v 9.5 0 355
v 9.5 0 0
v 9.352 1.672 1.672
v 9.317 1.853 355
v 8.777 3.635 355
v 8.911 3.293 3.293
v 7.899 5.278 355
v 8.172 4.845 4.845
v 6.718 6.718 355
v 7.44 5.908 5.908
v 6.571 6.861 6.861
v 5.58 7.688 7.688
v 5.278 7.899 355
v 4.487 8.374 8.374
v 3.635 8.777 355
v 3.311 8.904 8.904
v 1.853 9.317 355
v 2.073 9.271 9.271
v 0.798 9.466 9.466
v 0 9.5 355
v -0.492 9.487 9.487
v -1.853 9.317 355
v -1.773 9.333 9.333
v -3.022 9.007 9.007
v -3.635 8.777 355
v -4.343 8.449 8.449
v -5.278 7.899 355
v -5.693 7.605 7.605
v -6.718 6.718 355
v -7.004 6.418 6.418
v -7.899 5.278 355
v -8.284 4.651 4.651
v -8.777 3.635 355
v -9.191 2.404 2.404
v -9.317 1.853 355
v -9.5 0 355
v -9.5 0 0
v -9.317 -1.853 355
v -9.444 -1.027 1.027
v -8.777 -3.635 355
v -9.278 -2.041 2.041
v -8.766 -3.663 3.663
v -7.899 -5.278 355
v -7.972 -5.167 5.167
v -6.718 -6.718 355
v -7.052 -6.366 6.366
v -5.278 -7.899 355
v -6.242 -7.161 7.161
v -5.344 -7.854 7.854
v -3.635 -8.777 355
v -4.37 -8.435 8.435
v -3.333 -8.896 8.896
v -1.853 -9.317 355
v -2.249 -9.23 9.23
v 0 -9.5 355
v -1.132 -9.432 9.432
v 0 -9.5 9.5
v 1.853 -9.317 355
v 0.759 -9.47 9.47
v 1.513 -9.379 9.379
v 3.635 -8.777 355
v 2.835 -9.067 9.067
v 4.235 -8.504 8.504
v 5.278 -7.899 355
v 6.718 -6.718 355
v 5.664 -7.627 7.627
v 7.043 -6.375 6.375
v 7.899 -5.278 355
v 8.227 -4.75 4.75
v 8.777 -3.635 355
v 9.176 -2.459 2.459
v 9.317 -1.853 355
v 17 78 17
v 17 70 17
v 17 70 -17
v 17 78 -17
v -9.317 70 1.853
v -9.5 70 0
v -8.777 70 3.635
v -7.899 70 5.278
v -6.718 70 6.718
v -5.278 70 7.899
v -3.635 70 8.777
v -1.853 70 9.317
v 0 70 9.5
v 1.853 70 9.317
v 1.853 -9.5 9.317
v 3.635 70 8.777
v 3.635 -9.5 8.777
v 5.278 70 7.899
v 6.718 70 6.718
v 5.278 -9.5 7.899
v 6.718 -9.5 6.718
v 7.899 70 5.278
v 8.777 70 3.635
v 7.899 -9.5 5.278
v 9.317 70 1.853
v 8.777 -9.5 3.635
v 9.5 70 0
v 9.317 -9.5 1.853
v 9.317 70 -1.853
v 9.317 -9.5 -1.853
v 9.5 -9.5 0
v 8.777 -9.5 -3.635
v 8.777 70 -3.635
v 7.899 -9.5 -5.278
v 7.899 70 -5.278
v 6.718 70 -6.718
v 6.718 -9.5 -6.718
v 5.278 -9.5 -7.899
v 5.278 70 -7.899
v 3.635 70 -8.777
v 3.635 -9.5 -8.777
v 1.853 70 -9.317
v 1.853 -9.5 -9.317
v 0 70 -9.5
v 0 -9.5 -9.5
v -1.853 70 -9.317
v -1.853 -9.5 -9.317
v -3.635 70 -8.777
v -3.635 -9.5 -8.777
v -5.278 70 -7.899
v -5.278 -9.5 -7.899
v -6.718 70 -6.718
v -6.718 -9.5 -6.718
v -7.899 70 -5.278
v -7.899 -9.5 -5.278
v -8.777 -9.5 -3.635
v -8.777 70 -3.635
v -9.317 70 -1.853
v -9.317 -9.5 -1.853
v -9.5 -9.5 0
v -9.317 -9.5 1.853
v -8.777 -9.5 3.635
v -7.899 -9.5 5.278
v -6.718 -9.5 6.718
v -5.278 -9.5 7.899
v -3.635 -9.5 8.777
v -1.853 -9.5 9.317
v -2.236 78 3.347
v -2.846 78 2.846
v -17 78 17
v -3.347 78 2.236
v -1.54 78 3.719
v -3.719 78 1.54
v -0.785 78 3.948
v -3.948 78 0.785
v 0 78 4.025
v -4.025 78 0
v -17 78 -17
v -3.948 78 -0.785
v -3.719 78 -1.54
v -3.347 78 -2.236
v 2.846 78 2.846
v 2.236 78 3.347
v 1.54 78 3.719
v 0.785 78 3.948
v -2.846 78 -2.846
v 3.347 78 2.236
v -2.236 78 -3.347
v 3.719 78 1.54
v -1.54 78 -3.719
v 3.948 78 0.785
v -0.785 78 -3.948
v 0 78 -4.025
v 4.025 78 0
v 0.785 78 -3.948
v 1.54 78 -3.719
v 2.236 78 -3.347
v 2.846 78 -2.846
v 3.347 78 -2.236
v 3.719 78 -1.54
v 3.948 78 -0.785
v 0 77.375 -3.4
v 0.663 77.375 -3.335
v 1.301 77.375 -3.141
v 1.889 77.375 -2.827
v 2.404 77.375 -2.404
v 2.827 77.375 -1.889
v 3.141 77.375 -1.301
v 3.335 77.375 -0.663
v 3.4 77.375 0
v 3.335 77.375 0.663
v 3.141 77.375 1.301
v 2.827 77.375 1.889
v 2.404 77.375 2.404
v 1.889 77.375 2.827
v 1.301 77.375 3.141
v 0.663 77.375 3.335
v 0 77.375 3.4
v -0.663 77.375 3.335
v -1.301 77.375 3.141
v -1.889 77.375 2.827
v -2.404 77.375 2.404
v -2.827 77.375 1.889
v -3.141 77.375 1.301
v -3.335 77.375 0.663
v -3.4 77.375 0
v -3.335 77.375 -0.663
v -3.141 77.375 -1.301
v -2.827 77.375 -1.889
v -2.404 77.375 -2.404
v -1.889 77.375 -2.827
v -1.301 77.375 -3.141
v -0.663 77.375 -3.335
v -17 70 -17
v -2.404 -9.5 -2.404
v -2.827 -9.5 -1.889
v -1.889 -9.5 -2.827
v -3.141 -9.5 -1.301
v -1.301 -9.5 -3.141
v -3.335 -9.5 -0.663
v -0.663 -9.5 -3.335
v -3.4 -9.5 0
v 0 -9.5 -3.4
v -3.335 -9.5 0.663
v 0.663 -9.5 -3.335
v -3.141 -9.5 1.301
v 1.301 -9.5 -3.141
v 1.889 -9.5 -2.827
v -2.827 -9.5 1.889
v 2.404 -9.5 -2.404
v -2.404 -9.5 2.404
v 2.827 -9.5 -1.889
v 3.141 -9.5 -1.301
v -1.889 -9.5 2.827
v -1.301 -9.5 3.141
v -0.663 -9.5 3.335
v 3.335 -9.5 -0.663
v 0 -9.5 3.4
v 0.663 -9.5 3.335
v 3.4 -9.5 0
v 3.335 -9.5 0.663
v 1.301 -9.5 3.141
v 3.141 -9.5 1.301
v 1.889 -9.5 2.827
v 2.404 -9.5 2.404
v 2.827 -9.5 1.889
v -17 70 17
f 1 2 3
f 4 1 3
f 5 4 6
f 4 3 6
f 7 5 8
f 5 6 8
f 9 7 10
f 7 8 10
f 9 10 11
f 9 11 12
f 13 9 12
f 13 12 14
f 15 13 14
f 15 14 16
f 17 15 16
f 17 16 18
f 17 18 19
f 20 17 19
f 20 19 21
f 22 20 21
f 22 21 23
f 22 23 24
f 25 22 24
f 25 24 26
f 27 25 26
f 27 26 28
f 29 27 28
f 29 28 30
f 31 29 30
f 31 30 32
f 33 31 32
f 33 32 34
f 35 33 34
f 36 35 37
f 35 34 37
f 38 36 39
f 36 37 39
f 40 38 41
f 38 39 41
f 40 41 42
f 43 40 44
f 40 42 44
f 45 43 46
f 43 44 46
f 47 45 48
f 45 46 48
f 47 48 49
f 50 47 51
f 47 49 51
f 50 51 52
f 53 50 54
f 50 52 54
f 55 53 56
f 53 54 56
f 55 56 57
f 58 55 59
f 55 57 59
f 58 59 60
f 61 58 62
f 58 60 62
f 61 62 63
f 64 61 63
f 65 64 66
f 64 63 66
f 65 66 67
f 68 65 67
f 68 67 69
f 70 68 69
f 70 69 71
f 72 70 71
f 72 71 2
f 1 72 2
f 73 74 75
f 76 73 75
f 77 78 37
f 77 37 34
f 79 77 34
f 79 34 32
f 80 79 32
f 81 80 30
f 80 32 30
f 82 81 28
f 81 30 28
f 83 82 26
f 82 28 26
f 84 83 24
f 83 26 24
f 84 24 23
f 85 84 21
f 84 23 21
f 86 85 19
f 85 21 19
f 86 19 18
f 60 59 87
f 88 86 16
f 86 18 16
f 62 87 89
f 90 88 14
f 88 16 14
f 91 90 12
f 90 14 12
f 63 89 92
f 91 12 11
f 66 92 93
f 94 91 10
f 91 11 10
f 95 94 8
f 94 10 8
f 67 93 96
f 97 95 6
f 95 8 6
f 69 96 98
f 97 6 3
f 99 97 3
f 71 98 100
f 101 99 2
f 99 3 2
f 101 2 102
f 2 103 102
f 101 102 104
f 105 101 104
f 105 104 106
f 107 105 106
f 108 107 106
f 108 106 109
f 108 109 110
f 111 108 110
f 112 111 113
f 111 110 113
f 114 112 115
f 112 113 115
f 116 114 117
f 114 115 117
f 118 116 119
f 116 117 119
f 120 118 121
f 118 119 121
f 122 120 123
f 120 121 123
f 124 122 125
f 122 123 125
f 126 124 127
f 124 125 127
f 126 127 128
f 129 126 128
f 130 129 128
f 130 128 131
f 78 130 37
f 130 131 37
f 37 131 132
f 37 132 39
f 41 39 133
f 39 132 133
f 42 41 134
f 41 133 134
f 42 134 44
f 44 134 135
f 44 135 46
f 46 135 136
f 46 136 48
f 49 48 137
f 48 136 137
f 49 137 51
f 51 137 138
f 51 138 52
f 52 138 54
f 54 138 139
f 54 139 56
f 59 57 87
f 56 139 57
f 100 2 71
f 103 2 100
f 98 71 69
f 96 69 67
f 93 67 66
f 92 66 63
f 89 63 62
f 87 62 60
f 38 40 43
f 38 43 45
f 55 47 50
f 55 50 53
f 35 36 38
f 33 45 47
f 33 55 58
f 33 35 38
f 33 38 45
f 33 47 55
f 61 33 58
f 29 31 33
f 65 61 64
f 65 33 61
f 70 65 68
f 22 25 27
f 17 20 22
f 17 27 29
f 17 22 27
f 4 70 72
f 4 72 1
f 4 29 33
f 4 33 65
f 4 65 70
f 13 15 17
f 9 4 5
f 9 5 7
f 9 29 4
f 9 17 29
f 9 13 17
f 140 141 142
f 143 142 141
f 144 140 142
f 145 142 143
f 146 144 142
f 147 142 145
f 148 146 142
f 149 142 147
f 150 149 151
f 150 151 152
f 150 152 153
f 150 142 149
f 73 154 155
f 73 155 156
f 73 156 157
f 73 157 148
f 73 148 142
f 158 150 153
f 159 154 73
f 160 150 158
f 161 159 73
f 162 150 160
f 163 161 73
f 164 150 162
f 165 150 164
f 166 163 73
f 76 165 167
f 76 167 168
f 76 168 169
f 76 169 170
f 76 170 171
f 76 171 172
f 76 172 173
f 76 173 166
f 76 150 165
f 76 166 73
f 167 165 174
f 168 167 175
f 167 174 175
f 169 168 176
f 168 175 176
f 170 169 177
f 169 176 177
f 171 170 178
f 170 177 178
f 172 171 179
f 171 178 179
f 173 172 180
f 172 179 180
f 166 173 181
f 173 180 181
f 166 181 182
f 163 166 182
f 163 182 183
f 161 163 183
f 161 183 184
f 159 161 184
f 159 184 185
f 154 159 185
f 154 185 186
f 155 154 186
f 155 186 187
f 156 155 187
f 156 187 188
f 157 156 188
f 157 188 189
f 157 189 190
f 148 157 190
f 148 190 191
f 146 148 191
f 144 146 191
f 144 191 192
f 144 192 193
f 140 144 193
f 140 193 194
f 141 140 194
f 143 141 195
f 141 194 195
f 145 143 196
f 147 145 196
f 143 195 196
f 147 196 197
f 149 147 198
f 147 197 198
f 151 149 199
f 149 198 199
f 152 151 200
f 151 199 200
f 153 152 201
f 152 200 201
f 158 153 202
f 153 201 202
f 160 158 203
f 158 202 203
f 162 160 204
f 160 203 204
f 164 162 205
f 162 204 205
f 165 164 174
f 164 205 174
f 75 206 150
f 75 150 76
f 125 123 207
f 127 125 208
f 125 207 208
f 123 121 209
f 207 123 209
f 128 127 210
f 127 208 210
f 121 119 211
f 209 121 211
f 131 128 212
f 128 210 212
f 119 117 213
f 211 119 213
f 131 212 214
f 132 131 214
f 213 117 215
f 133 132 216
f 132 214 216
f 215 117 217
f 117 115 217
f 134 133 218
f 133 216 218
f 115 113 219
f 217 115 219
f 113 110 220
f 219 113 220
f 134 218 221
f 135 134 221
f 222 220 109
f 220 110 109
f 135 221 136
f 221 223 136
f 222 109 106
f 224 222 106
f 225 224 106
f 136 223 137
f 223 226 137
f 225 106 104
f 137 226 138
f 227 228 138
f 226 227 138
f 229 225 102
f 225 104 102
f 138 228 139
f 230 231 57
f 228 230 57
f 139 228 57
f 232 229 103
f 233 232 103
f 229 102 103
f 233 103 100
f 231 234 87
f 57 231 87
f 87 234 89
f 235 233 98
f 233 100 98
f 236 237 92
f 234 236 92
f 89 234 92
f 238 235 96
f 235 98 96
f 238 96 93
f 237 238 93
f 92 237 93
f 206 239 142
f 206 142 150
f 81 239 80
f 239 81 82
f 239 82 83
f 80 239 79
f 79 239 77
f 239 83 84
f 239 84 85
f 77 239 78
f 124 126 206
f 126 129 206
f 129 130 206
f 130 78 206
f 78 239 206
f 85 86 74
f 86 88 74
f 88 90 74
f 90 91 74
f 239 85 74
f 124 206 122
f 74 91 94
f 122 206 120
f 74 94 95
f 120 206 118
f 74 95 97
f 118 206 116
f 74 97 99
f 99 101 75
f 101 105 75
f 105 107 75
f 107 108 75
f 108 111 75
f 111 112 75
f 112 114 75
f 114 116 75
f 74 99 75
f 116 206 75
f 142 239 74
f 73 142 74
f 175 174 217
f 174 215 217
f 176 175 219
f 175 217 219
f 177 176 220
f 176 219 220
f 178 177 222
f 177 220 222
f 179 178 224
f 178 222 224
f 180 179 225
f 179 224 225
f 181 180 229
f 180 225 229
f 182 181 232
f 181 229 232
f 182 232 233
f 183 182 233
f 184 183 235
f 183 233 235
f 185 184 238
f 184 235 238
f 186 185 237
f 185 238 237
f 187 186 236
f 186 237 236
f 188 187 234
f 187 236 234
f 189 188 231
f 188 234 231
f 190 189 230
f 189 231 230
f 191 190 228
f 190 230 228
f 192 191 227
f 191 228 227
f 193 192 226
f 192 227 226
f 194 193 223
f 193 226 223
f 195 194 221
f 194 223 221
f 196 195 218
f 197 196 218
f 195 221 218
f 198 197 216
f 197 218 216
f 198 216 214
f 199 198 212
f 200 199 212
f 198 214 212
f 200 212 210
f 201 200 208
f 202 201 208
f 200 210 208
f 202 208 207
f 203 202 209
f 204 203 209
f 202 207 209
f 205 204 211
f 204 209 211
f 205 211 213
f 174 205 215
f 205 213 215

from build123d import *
from build123d.topology import SkipClean

# Parameters (mm, degrees)
SKETCH2_R                        = 9.5
BOSS_EXTRUDE1_DEPTH              = 355
SKETCH3_R                        = 9.5
BOSS_EXTRUDE2_DEPTH              = 70
BOSS_EXTRUDE3_START              = -9.5
SKETCH3_2_R                      = 9.5
BOSS_EXTRUDE3_DEPTH              = 9.5
SKETCH5_W                        = 34
SKETCH5_H                        = 34
BOSS_EXTRUDE4_DEPTH              = 8
M8X1_25_TAPPED_HOLE1_D           = 6.8
M8X1_25_TAPPED_HOLE1_CSINK_D     = 8.05
M8X1_25_TAPPED_HOLE1_CSINK_ANGLE = 90


with BuildPart() as part:
    # Sketch2 → Boss-Extrude1 (new body)
    with BuildSketch(Plane.XY):
        Circle(SKETCH2_R)
    extrude(amount=BOSS_EXTRUDE1_DEPTH)

    # Sketch3 → Boss-Extrude2 (add)
    with BuildSketch(Plane(origin=(0, 0, 0), x_dir=(1, 0, 0), z_dir=(0, 1, 0))):
        Circle(SKETCH3_R)
    extrude(amount=BOSS_EXTRUDE2_DEPTH)

    # Sketch3<2> → Boss-Extrude3 (add)
    with SkipClean():  # the faces are left unmerged after this step: merging them gives an invalid solid
        with BuildSketch(Plane(origin=(0, 0, 0), x_dir=(1, 0, 0), z_dir=(0, 1, 0)).offset(BOSS_EXTRUDE3_START)):
            Circle(SKETCH3_2_R)
        extrude(amount=BOSS_EXTRUDE3_DEPTH)

    # Sketch5 → Boss-Extrude4 (add)
    with BuildSketch(Plane(origin=(0, 70, 0), x_dir=(1, 0, 0), z_dir=(0, 1, 0))):
        Rectangle(SKETCH5_W, SKETCH5_H)
    extrude(amount=BOSS_EXTRUDE4_DEPTH)

    # M8x1.25 Tapped Hole1 (through all)
    with Locations(Plane.ZX.offset(78)):
        with Locations((0, 0)):
            CounterSinkHole(M8X1_25_TAPPED_HOLE1_D / 2, M8X1_25_TAPPED_HOLE1_CSINK_D / 2, counter_sink_angle=M8X1_25_TAPPED_HOLE1_CSINK_ANGLE)


solid = part.part
